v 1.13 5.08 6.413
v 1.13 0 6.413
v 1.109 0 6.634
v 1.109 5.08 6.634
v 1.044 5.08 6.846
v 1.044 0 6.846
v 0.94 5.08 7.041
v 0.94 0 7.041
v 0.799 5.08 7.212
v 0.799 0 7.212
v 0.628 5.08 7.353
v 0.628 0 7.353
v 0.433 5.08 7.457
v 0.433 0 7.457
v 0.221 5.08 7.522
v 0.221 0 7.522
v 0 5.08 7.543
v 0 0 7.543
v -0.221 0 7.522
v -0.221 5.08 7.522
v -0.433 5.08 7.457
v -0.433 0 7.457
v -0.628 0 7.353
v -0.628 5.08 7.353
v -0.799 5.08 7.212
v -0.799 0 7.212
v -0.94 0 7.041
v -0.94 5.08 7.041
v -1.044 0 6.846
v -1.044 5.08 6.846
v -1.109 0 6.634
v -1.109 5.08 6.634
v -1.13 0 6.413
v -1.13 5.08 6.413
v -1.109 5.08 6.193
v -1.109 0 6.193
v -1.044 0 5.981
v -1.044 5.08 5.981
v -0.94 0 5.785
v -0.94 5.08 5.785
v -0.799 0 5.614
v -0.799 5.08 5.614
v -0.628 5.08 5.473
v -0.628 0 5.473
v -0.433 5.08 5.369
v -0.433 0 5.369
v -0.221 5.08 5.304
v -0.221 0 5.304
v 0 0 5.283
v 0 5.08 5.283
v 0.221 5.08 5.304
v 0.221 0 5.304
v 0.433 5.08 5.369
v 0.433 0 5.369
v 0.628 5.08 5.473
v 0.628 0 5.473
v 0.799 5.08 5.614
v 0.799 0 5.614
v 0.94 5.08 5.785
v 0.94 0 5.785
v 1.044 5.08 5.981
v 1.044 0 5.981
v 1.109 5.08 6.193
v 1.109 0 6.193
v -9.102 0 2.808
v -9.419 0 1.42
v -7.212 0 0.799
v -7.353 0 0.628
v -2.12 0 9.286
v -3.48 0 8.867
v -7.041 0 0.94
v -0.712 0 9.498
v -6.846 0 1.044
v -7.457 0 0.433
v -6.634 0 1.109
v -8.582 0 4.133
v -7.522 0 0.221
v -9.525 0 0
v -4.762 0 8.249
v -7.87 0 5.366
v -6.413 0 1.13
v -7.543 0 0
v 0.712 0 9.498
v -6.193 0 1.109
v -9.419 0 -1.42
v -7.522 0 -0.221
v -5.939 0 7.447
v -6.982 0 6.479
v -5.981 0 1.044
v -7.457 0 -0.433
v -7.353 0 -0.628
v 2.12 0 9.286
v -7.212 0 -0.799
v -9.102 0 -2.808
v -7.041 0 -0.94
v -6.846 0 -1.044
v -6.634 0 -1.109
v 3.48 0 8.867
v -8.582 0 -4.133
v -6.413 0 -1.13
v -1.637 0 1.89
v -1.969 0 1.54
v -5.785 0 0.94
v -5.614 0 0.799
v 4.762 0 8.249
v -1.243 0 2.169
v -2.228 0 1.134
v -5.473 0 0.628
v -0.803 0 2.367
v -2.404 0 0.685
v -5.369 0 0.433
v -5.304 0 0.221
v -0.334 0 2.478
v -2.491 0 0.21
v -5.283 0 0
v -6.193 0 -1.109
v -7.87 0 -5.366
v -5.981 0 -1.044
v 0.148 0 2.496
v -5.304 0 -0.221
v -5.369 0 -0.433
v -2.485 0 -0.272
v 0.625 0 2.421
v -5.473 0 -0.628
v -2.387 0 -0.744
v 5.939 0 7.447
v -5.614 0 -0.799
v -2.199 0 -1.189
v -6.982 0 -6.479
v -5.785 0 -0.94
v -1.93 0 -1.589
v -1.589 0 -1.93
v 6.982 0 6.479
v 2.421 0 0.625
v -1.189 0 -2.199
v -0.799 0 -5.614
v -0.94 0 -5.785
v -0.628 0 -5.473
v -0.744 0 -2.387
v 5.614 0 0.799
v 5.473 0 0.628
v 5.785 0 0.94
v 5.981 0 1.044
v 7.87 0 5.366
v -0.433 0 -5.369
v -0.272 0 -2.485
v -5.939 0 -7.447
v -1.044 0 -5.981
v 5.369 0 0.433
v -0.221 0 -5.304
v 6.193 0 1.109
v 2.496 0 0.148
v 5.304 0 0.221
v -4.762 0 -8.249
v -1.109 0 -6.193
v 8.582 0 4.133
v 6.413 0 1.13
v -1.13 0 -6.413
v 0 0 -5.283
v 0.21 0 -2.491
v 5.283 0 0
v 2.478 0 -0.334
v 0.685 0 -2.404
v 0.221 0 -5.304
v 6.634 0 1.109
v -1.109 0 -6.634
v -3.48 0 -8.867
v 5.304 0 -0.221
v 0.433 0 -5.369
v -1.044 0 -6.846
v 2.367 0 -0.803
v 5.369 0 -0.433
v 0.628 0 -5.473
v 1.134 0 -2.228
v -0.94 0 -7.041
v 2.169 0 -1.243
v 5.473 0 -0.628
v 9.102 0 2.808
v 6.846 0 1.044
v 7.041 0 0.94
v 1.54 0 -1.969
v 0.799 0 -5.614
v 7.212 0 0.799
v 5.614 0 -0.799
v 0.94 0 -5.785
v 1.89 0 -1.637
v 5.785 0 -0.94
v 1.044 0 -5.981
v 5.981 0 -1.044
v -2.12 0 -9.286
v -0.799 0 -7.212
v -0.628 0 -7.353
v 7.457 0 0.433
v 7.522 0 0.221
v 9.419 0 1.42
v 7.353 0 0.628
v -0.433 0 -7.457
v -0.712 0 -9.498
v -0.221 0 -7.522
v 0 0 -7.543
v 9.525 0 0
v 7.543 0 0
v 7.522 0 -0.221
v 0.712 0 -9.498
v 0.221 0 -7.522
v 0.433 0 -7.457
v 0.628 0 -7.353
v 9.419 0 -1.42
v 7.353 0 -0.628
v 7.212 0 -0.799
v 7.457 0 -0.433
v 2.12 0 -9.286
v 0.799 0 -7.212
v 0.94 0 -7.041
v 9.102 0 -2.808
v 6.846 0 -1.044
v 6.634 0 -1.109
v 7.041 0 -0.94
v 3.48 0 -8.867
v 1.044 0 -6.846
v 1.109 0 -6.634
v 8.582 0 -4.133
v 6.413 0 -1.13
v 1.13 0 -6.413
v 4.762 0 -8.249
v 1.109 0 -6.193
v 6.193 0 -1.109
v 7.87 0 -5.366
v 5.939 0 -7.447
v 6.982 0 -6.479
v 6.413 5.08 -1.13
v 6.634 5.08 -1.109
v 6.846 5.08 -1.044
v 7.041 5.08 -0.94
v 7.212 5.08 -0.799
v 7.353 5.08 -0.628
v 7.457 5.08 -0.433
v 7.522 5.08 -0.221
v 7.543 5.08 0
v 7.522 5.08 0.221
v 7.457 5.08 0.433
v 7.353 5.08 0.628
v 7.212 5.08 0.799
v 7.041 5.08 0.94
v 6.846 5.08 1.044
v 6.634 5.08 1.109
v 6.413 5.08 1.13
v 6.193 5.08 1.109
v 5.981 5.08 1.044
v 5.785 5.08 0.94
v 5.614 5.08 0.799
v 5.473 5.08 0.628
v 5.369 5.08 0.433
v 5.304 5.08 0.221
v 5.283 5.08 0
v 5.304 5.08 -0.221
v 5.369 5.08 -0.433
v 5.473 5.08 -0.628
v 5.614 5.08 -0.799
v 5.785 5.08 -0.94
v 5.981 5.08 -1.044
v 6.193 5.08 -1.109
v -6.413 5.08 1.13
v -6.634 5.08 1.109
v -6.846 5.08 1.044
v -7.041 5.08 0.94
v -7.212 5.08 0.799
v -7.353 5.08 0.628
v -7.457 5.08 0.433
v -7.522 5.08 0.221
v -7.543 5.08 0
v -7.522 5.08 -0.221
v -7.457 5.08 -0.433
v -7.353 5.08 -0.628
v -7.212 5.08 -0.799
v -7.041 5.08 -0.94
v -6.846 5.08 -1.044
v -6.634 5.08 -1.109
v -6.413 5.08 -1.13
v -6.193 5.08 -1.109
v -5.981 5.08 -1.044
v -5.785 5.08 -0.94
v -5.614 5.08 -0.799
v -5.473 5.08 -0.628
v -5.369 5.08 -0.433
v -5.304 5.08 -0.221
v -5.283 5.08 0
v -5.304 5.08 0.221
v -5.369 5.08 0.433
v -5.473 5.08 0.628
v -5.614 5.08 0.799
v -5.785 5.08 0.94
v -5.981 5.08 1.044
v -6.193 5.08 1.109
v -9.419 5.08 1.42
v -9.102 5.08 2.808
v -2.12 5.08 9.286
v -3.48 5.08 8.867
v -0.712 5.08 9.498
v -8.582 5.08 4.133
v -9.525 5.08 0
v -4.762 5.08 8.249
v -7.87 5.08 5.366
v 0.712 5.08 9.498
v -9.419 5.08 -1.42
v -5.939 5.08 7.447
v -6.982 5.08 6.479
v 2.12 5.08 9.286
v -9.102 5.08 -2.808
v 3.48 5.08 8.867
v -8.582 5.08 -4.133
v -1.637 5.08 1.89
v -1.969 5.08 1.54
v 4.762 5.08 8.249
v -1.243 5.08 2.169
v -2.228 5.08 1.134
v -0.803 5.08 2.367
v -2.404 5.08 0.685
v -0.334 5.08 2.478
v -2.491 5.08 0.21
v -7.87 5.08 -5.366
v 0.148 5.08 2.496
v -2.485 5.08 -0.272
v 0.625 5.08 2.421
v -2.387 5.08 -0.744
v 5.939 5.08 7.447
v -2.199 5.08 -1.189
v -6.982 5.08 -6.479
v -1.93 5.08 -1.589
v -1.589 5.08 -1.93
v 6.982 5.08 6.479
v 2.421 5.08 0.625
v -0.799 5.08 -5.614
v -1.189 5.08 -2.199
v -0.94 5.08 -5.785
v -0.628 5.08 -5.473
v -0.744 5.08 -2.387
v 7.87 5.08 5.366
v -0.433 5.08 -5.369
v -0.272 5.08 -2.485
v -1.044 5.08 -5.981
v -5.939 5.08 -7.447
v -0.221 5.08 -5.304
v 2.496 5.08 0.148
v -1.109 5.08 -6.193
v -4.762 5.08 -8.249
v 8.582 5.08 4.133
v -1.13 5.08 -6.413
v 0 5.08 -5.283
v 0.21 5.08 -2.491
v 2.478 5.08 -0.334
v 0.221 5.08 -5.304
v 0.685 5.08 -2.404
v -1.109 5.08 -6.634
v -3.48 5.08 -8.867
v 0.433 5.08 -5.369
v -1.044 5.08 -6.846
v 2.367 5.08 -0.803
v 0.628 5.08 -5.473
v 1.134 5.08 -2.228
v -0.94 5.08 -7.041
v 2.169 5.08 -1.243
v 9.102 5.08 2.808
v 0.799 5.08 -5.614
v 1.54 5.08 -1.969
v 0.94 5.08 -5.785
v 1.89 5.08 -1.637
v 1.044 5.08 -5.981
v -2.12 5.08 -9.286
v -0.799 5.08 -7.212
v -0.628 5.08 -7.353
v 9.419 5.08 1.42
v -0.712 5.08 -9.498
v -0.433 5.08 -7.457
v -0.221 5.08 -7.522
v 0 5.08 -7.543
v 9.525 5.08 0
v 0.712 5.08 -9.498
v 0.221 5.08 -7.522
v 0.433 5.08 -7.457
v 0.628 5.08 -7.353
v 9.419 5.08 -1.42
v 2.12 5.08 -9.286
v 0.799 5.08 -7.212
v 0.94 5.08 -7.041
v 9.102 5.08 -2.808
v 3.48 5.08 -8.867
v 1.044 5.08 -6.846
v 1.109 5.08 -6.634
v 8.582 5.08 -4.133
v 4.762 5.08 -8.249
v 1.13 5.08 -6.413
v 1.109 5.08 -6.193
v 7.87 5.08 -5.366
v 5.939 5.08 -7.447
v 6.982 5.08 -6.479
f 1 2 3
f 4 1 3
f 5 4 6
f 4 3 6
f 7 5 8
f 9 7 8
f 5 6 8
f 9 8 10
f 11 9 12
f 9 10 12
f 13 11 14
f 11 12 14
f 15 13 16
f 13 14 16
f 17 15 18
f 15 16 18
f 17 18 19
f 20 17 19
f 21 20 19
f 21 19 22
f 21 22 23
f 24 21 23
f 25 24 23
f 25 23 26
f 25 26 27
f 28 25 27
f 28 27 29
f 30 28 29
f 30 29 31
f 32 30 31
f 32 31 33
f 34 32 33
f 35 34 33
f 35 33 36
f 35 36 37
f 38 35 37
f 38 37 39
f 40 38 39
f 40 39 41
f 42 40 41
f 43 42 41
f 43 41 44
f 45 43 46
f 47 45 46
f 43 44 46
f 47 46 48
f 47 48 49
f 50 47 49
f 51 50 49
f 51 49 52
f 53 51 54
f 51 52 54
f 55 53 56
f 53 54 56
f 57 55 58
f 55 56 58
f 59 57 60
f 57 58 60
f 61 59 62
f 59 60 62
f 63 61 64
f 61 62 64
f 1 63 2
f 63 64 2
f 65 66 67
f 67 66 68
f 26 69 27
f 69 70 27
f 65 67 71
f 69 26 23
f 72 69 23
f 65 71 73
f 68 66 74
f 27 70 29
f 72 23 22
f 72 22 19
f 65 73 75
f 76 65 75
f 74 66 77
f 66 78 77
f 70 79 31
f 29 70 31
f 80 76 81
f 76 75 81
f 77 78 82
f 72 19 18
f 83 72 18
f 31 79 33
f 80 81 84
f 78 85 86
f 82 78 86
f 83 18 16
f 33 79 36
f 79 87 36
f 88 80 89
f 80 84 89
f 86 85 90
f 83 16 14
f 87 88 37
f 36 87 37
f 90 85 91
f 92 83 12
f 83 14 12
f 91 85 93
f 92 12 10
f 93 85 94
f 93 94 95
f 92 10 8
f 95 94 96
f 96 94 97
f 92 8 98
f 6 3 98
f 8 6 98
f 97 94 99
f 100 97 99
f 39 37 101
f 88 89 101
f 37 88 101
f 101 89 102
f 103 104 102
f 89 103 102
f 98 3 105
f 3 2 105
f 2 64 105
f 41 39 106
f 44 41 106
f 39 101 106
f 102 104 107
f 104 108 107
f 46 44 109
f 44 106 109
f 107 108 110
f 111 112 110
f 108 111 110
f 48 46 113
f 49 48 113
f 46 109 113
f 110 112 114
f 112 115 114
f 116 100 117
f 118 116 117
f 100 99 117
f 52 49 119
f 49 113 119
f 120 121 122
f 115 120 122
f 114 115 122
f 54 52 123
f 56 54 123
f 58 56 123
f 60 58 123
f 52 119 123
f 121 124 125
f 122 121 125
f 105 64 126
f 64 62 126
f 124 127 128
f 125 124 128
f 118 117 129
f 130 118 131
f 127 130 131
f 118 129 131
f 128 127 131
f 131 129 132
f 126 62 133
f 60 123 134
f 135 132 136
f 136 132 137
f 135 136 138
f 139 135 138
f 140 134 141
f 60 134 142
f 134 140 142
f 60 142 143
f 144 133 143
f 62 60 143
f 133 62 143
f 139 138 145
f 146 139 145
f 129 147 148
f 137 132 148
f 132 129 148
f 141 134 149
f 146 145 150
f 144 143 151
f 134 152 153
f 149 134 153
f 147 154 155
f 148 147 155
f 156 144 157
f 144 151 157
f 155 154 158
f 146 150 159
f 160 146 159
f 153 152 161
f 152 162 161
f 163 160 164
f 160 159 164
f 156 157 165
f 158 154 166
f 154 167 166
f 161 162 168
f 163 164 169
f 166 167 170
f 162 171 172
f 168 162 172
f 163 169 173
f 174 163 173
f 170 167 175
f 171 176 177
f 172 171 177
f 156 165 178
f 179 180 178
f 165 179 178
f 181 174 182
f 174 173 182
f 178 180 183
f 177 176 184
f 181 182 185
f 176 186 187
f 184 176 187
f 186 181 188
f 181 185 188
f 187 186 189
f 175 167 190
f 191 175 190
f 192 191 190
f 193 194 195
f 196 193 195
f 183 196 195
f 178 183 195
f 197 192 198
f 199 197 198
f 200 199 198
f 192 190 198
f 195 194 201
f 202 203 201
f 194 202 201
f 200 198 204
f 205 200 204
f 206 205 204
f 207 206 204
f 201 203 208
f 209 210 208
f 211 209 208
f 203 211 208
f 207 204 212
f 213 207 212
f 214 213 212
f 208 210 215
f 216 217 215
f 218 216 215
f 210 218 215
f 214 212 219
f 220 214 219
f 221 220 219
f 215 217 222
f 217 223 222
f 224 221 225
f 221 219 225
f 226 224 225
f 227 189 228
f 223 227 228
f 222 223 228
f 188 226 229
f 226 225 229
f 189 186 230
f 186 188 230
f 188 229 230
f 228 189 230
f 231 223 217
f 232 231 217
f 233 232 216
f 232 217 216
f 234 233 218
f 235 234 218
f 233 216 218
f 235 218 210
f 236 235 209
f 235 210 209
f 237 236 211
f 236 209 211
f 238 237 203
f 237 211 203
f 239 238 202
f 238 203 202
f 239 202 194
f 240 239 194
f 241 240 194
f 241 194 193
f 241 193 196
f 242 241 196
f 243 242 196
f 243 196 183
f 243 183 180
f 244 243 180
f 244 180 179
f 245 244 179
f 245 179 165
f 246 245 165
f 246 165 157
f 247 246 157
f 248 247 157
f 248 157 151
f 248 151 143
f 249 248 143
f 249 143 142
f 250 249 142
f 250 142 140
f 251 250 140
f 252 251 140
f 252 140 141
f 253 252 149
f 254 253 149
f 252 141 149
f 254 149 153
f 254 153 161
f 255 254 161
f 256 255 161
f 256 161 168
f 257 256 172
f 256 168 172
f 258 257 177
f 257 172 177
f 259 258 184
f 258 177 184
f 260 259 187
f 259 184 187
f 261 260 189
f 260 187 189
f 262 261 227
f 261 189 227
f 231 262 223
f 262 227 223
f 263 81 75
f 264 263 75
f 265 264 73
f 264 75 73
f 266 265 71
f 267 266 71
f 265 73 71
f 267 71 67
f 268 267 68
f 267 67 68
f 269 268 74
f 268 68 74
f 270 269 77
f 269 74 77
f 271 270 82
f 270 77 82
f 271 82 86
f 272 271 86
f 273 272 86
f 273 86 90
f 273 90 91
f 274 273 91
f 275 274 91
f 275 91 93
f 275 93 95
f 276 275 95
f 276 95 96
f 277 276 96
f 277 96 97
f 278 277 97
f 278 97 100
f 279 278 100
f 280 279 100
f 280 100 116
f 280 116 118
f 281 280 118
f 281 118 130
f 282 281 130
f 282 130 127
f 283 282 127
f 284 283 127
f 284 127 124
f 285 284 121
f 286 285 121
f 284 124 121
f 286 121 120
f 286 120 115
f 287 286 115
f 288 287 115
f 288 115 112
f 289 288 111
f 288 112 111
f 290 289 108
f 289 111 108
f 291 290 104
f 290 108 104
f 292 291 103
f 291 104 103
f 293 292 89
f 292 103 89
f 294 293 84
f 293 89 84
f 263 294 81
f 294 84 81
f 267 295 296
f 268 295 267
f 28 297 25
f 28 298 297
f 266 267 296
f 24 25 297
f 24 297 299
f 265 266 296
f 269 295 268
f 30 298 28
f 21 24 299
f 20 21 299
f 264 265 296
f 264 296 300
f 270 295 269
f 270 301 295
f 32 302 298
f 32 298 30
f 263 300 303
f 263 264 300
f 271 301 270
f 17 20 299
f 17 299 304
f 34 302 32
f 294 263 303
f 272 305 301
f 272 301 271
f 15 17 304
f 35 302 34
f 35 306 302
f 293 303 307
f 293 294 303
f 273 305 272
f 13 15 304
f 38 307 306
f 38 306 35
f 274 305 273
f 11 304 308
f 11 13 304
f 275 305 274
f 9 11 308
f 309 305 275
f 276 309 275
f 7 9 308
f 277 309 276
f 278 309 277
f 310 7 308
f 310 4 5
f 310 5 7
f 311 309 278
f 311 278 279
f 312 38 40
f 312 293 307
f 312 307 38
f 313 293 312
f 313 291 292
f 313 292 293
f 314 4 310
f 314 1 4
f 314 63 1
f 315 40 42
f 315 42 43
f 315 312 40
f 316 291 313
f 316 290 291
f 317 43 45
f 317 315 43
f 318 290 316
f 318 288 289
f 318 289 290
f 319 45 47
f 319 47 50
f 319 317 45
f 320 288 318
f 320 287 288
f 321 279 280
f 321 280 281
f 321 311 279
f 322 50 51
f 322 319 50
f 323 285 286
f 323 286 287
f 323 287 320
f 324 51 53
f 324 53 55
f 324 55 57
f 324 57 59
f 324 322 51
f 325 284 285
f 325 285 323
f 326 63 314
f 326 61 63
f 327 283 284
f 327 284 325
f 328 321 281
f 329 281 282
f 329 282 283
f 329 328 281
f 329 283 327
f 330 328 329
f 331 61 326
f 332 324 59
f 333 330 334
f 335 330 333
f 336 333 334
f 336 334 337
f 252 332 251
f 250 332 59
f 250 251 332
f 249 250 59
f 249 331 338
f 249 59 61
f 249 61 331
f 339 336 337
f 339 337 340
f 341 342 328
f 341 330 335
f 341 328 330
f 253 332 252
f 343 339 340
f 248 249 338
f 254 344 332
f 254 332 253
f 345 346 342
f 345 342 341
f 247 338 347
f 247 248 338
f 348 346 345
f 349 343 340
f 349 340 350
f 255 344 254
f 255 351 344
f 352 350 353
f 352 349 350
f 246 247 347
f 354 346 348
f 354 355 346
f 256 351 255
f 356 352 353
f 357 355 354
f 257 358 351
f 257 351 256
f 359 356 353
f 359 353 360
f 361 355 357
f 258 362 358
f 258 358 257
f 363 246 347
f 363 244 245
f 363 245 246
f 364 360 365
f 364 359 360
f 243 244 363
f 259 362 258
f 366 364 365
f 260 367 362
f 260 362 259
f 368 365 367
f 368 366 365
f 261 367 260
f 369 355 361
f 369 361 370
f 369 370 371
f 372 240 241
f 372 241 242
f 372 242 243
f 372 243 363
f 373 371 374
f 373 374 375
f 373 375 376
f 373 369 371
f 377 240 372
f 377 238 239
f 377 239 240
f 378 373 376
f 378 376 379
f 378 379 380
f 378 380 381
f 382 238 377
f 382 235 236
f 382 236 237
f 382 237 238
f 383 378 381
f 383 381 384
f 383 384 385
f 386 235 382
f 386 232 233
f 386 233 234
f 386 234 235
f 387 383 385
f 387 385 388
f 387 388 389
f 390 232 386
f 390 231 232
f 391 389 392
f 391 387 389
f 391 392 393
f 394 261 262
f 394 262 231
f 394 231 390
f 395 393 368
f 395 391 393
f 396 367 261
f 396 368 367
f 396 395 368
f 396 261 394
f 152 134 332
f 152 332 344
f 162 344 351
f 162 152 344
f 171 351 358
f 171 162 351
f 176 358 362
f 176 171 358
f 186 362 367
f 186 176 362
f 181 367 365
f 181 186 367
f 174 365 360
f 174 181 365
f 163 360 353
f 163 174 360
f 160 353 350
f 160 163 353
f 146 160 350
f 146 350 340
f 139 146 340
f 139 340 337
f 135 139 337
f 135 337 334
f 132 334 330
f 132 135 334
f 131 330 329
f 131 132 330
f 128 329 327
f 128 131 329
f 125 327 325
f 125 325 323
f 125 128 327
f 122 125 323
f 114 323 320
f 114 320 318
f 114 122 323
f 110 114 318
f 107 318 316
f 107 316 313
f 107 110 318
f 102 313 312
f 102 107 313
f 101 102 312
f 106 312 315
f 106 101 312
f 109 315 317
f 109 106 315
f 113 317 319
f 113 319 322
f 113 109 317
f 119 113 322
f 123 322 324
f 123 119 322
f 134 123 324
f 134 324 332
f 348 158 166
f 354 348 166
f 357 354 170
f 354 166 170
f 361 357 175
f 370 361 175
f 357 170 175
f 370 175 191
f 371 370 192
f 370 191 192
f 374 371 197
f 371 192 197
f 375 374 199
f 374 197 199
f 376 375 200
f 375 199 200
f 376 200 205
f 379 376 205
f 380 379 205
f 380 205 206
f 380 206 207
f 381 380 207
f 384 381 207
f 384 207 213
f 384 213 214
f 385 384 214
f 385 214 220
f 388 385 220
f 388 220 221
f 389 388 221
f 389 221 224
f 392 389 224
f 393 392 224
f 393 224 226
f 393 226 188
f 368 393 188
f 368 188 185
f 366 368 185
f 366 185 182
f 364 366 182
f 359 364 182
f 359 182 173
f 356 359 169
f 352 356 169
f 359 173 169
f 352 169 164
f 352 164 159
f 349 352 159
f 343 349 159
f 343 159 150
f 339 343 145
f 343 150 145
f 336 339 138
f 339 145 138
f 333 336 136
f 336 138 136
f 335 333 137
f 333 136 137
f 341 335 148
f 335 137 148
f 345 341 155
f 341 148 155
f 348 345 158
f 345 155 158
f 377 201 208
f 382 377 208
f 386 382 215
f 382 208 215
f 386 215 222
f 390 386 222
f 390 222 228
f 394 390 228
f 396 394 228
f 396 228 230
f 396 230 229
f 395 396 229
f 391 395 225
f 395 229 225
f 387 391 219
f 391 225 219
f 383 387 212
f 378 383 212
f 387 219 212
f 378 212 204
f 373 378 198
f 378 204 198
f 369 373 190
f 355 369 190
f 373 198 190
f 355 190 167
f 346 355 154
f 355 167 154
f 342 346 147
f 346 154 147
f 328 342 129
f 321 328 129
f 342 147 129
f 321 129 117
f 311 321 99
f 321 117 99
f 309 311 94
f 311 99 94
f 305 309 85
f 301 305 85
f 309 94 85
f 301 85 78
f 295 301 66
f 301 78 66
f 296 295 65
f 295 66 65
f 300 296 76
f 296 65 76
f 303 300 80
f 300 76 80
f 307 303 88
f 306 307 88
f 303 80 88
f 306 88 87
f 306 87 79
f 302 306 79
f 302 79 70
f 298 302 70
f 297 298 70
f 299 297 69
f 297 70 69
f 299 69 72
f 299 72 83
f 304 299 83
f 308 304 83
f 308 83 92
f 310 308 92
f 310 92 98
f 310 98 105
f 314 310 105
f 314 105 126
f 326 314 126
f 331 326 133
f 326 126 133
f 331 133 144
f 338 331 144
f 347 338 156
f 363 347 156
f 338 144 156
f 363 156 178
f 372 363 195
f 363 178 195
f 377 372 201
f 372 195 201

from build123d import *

# Parameters (mm, degrees)
SKETCH1_R                   = 9.525
BOSS_EXTRUDE1_DEPTH         = 5.08
F_43_0_089_DIAMETER_HOLE1_D = 2.2606
CIRPATTERN1_COUNT           = 4


with BuildPart() as part:
    # Sketch1 → Boss-Extrude1 (new body)
    with BuildSketch(Plane(origin=(0, 0, 0), x_dir=(1, 0, 0), z_dir=(0, 1, 0))):
        Circle(SKETCH1_R)
        with BuildLine():
            Line((0.624652949, -2.420704173), (2.420704173, -0.624652949))
            ThreePointArc((2.420704173, -0.624652949), (-1.767766953, 1.767766953), (0.624652949, -2.420704173))
        make_face(mode=Mode.SUBTRACT)
    extrude(amount=BOSS_EXTRUDE1_DEPTH)

    # #43 (0.089) Diameter Hole1 (through all)
    with Locations(Plane(origin=(0, 5.08, 0), x_dir=(1, 0, 0), z_dir=(0, 1, 0))):
        with Locations((0, 6.413072646)):
            f_43_0_089_diameter_hole1 = Hole(F_43_0_089_DIAMETER_HOLE1_D / 2)

    # CirPattern1: #43 (0.089) Diameter Hole1 ×4 about axis
    cirpattern1_axis = Axis((0, 0, 0), (0, 1, 0))
    for i in range(1, CIRPATTERN1_COUNT):
        add(f_43_0_089_diameter_hole1.rotate(cirpattern1_axis, i * 360 / CIRPATTERN1_COUNT), mode=Mode.SUBTRACT)


solid = part.part
